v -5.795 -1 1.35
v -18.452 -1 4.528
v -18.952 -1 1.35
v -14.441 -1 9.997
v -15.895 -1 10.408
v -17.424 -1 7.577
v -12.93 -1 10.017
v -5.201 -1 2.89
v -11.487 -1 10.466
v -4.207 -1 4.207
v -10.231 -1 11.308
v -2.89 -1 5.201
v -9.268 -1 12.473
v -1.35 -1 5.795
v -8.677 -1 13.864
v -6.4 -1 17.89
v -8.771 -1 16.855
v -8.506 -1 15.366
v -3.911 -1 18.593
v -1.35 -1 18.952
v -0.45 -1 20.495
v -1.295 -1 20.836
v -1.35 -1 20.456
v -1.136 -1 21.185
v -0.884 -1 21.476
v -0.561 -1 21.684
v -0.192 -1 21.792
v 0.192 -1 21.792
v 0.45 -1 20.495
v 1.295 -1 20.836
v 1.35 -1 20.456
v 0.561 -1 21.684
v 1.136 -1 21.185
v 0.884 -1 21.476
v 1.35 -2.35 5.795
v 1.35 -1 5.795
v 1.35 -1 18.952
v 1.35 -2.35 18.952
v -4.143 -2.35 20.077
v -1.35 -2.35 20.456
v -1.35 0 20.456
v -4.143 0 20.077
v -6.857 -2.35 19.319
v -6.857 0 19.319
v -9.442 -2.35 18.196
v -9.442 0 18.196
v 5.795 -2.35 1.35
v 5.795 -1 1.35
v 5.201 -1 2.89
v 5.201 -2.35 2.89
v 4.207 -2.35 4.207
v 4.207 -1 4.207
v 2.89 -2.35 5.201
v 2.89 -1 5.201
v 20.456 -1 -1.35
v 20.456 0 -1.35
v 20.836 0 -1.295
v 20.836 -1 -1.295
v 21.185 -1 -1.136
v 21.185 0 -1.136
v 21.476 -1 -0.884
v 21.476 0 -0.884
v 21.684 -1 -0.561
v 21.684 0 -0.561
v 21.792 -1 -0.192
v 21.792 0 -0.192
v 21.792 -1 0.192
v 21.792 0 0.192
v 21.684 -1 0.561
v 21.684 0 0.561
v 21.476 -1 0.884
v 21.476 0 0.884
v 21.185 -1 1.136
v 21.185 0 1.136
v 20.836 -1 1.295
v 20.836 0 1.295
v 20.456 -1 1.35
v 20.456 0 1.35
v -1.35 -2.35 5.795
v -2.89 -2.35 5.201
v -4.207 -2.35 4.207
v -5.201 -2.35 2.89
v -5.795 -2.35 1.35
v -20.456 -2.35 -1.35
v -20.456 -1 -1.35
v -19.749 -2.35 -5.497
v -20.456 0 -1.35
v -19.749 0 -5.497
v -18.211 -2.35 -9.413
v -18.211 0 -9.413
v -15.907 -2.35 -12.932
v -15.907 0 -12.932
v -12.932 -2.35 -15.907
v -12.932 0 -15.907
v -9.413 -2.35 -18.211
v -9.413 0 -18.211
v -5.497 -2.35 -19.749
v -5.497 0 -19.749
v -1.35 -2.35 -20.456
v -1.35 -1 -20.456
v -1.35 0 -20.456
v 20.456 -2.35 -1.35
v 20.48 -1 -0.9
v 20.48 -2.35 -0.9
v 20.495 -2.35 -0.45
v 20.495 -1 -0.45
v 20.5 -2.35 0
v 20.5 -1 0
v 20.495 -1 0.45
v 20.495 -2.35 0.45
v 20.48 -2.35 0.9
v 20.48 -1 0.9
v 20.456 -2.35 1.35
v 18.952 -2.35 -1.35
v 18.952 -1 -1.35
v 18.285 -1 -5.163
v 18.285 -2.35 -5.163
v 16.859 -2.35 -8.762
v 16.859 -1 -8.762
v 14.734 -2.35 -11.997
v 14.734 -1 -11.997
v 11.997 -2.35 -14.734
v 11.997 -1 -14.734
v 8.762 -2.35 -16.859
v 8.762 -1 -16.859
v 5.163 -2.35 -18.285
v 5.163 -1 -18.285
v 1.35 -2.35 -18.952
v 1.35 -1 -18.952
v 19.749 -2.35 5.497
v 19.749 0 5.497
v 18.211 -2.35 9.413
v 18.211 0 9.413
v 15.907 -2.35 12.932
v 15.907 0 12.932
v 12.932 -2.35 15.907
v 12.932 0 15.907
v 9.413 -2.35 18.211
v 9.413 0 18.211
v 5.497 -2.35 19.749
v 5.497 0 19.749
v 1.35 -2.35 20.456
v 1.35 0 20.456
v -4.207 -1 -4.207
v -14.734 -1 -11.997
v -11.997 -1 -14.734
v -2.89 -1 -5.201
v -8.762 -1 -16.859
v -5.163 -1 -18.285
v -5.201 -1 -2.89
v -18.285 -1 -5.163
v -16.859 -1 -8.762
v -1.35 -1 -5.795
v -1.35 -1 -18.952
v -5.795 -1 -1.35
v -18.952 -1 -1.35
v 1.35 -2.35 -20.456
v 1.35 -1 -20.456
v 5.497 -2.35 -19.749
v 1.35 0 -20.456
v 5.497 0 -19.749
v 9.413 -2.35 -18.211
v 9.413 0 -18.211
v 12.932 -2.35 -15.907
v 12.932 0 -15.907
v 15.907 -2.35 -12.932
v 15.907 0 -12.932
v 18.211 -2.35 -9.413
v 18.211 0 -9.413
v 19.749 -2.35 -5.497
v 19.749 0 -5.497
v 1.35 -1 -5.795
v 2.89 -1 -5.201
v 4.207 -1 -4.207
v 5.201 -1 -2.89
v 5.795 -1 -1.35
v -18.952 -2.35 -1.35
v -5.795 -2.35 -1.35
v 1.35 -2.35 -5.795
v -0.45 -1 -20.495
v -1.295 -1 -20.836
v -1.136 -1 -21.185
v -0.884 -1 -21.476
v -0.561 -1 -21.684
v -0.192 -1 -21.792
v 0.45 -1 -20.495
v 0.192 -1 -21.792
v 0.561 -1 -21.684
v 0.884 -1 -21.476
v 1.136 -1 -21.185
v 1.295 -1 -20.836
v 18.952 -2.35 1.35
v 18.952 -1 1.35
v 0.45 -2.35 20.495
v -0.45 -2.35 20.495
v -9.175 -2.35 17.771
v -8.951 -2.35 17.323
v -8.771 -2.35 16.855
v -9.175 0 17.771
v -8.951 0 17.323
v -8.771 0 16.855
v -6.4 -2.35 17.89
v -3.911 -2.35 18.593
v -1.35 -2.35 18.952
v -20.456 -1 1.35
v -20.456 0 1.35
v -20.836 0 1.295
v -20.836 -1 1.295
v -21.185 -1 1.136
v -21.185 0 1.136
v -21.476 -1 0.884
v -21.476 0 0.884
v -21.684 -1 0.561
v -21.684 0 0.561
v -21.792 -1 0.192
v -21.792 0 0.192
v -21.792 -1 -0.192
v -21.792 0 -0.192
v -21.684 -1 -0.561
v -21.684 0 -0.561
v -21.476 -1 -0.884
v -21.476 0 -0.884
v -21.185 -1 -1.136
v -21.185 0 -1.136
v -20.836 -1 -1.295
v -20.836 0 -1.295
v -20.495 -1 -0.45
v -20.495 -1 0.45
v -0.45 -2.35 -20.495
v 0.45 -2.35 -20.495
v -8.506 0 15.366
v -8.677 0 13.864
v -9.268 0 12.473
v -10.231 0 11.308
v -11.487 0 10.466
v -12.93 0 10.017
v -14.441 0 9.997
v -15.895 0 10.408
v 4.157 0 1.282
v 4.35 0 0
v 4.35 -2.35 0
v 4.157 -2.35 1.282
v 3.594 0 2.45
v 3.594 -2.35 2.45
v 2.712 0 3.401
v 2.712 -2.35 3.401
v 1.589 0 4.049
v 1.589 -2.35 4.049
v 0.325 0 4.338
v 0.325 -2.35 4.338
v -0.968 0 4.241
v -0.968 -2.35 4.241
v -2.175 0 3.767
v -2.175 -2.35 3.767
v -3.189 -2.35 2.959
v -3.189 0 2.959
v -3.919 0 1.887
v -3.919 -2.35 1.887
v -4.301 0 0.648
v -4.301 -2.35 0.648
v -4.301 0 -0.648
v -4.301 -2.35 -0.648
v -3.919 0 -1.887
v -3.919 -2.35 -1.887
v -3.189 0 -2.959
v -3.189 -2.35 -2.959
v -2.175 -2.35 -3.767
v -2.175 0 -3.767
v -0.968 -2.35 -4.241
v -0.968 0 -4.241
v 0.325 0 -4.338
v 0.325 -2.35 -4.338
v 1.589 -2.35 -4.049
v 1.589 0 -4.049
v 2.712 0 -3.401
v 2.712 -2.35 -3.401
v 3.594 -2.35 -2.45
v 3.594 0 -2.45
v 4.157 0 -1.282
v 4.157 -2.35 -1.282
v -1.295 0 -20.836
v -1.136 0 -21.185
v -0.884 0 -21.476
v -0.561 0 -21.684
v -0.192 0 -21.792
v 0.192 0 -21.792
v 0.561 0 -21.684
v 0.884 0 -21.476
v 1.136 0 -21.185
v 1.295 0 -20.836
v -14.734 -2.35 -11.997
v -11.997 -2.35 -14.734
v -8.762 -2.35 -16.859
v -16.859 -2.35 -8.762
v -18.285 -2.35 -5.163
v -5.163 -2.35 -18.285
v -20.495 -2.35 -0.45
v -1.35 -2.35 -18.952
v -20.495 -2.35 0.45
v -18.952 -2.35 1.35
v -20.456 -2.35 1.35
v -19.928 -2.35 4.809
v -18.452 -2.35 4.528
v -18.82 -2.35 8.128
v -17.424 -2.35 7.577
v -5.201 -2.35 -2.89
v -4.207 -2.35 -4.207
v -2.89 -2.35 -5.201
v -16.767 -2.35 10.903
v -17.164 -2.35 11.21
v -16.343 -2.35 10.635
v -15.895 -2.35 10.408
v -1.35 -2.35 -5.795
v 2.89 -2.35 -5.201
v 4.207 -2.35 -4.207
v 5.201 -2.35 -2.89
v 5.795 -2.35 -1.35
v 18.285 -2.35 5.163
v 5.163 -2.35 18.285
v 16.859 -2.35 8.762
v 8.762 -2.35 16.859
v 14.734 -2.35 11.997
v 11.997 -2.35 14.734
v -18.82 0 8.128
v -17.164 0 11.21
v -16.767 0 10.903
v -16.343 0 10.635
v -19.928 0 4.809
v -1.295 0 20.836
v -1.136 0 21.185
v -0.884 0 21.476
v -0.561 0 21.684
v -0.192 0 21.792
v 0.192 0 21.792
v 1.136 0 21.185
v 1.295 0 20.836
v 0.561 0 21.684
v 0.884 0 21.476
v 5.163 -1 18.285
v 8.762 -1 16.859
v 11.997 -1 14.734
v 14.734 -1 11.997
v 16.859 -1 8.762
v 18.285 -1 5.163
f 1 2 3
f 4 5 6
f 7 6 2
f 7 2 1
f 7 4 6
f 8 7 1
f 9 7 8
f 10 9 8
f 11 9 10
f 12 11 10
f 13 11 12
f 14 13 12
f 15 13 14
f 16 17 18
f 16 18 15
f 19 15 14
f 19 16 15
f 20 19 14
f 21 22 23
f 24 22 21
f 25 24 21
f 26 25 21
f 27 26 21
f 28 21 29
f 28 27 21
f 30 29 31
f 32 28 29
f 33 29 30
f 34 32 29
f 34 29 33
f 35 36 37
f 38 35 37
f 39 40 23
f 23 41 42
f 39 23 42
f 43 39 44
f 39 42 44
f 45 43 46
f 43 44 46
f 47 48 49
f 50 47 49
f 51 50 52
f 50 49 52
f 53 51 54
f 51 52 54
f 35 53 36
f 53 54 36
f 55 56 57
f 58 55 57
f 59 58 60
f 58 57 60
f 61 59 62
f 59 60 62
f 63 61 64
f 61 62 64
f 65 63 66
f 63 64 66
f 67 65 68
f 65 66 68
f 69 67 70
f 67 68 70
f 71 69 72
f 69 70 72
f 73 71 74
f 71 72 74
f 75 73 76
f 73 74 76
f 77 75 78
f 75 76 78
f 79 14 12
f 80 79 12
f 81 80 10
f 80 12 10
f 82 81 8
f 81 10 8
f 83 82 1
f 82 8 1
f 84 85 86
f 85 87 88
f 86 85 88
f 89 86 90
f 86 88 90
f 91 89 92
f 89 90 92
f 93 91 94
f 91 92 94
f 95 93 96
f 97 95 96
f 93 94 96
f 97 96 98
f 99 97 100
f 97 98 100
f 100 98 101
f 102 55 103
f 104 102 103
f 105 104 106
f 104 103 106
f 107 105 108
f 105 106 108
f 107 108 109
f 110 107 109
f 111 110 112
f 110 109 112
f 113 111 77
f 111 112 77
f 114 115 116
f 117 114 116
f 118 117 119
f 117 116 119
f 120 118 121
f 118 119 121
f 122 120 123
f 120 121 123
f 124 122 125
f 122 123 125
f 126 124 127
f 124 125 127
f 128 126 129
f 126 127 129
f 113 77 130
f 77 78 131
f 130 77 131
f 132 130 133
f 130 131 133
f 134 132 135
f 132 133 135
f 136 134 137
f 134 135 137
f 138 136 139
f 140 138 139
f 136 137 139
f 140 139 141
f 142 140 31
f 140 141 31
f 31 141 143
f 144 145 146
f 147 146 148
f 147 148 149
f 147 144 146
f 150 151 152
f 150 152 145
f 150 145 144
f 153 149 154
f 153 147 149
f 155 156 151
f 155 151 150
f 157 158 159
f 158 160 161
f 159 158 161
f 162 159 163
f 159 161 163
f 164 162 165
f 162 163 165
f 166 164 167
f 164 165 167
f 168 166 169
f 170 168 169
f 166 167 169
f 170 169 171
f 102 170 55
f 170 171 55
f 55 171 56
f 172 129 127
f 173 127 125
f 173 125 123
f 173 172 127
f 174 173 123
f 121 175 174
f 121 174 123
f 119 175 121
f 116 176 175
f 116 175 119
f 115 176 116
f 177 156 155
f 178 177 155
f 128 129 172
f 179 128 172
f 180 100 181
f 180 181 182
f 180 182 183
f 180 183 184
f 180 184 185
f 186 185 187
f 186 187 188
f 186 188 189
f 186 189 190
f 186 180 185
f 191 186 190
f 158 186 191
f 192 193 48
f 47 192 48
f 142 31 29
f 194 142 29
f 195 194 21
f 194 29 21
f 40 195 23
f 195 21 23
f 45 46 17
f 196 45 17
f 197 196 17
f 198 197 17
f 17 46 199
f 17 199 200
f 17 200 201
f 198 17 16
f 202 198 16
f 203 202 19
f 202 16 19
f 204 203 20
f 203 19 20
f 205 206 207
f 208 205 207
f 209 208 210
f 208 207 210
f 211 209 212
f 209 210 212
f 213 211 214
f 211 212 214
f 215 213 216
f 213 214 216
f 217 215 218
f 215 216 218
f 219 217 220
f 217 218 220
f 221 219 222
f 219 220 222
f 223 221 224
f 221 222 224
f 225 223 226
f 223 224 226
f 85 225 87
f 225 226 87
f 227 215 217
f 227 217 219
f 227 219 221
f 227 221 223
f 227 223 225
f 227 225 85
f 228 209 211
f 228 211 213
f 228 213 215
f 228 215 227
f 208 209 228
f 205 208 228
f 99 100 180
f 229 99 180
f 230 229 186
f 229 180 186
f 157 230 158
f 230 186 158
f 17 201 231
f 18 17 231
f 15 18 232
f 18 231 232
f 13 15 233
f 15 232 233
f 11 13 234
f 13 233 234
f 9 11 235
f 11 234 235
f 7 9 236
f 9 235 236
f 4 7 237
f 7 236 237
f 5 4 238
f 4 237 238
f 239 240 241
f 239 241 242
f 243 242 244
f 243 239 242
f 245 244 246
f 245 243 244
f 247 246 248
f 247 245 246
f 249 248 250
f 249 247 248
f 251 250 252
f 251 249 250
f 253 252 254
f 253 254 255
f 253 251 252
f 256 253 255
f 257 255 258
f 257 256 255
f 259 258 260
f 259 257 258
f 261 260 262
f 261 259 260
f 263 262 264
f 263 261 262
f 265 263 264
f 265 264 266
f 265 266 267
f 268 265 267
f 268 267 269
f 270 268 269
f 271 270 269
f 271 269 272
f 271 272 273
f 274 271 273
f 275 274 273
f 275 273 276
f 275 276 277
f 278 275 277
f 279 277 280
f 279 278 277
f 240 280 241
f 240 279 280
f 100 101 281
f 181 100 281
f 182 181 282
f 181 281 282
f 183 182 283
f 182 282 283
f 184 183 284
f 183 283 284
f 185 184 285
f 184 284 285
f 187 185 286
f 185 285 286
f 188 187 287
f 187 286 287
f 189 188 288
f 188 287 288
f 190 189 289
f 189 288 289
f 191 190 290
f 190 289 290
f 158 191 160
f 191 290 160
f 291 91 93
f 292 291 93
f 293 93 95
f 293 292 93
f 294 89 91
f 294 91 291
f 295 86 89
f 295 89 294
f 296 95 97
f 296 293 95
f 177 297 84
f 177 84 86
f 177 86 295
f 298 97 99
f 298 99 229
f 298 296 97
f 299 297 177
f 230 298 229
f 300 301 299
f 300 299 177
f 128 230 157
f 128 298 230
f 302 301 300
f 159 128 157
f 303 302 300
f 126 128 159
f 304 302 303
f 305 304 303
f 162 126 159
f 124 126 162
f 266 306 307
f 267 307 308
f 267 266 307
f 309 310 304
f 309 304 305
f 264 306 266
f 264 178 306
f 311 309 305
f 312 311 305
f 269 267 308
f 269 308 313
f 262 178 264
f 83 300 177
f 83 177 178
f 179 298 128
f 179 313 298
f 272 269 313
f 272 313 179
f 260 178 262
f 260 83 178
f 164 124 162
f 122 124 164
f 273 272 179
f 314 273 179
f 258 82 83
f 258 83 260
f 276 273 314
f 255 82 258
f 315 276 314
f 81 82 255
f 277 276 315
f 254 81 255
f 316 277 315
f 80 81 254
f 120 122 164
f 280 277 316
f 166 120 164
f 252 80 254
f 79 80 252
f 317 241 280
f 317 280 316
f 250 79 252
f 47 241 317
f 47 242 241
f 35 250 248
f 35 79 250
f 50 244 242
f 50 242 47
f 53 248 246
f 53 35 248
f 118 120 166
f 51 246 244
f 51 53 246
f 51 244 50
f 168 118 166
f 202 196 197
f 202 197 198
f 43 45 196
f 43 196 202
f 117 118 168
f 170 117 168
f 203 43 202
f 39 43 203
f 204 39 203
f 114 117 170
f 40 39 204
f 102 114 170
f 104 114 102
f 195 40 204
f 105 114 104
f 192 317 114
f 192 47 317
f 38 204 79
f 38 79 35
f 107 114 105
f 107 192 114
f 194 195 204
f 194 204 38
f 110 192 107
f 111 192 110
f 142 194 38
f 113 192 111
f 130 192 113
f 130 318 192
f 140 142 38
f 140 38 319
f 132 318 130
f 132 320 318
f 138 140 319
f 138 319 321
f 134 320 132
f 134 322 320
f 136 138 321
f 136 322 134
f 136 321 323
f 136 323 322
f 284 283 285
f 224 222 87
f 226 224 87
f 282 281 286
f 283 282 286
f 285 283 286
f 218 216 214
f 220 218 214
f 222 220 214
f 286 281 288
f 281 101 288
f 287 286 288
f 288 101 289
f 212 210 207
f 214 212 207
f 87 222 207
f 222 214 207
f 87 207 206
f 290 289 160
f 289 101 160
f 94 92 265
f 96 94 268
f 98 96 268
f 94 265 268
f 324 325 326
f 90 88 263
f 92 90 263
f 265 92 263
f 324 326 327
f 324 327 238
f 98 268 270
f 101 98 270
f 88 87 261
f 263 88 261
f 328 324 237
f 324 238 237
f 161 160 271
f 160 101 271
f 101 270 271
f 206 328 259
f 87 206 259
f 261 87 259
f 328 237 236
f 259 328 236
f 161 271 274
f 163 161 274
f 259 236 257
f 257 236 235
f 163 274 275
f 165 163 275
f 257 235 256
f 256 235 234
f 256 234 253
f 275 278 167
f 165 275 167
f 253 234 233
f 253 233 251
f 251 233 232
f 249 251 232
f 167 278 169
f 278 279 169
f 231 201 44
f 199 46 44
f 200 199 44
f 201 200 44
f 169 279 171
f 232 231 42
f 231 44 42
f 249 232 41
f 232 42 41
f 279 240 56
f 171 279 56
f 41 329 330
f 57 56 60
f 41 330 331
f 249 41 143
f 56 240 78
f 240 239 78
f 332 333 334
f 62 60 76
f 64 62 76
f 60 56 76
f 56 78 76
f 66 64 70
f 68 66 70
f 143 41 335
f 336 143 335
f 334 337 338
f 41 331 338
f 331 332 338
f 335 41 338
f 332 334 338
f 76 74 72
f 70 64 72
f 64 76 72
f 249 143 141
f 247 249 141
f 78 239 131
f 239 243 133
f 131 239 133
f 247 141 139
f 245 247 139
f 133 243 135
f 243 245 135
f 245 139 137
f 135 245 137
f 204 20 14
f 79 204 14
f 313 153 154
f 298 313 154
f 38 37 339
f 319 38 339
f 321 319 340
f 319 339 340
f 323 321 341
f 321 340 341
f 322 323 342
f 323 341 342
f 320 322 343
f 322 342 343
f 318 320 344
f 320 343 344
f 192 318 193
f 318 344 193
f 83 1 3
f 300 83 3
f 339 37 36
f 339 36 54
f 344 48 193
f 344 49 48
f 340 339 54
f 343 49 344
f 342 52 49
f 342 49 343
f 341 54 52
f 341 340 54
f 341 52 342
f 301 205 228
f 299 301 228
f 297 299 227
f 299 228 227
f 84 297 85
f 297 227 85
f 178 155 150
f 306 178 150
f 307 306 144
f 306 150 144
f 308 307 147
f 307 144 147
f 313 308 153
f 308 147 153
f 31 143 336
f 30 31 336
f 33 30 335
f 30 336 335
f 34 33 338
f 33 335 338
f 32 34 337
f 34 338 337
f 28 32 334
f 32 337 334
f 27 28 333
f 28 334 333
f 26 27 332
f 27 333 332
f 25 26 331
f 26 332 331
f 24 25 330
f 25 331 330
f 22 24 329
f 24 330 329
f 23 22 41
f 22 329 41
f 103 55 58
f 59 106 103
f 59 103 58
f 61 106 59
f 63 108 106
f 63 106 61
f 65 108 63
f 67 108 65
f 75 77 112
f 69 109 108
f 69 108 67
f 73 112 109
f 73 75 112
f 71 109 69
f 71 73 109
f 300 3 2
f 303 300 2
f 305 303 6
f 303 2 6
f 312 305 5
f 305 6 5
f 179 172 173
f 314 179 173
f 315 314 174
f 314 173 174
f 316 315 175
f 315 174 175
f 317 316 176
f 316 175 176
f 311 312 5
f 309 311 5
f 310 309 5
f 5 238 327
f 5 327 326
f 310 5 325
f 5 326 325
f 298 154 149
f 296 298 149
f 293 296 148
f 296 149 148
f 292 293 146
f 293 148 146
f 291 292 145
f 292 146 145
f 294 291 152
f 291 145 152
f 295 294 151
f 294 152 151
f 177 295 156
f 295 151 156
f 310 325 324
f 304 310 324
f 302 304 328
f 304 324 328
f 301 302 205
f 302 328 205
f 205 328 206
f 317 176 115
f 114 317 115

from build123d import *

# Parameters (mm, degrees)
F0_R     = 4.35
F1_DEPTH = 2.35
F2_DEPTH = 1


with BuildPart() as f1:
    # F0 (on Front) → F1 (new body)
    with BuildSketch(Plane.XZ):
        with BuildLine():
            ThreePointArc((18.951979, 1.35), (18.987991, 0.675427), (19, 0))
            ThreePointArc((19, 0), (18.987991, -0.675427), (18.951979, -1.35))
            ThreePointArc((18.951979, -1.35), (13.435029, -13.435029), (1.35, -18.951979))
            ThreePointArc((1.35, -18.951979), (0, -19), (-1.35, -18.951979))
            ThreePointArc((-1.35, -18.951979), (-13.435029, -13.435029), (-18.951979, -1.35))
            ThreePointArc((-18.951979, -1.35), (-19, 0), (-18.951979, 1.35))
            ThreePointArc((-18.951979, 1.35), (-18.002767, 6.074569), (-15.895465, 10.408371))
            ThreePointArc((-15.895465, 10.408371), (-16.558319, 10.763563), (-17.163626, 11.209815))
            ThreePointArc((-17.163626, 11.209815), (-19.444888, 6.492022), (-20.4555, 1.35))
            ThreePointArc((-20.4555, 1.35), (-20.5, 0), (-20.4555, -1.35))
            ThreePointArc((-20.4555, -1.35), (-14.495689, -14.495689), (-1.35, -20.4555))
            ThreePointArc((-1.35, -20.4555), (0, -20.5), (1.35, -20.4555))
            ThreePointArc((1.35, -20.4555), (14.495689, -14.495689), (20.4555, -1.35))
            ThreePointArc((20.4555, -1.35), (20.488872, -0.675367), (20.5, 0))
            ThreePointArc((20.5, 0), (20.488872, 0.675367), (20.4555, 1.35))
            ThreePointArc((20.4555, 1.35), (14.495689, 14.495689), (1.35, 20.4555))
            ThreePointArc((1.35, 20.4555), (0, 20.5), (-1.35, 20.4555))
            ThreePointArc((-1.35, 20.4555), (-5.512738, 19.744866), (-9.441543, 18.196353))
            ThreePointArc((-9.441543, 18.196353), (-9.057906, 17.549546), (-8.770617, 16.854563))
            ThreePointArc((-8.770617, 16.854563), (-5.167834, 18.283695), (-1.35, 18.951979))
            ThreePointArc((-1.35, 18.951979), (0, 19), (1.35, 18.951979))
            ThreePointArc((1.35, 18.951979), (13.435029, 13.435029), (18.951979, 1.35))
        make_face()
        with BuildLine():
            ThreePointArc((5.95, 0), (5.911079, 0.679444), (5.794825, 1.35))
            ThreePointArc((5.794825, 1.35), (4.207285, 4.207285), (1.35, 5.794825))
            ThreePointArc((1.35, 5.794825), (0, 5.95), (-1.35, 5.794825))
            ThreePointArc((-1.35, 5.794825), (-4.207285, 4.207285), (-5.794825, 1.35))
            ThreePointArc((-5.794825, 1.35), (-5.95, 0), (-5.794825, -1.35))
            ThreePointArc((-5.794825, -1.35), (-4.207285, -4.207285), (-1.35, -5.794825))
            ThreePointArc((-1.35, -5.794825), (0, -5.95), (1.35, -5.794825))
            ThreePointArc((1.35, -5.794825), (4.207285, -4.207285), (5.794825, -1.35))
            ThreePointArc((5.794825, -1.35), (5.911079, -0.679444), (5.95, 0))
        make_face()
        Circle(F0_R, mode=Mode.SUBTRACT)
        with BuildLine():
            ThreePointArc((-18.951979, 1.35), (-19, 0), (-18.951979, -1.35))
            Line((-18.951979, -1.35), (-5.794825, -1.35))
            ThreePointArc((-5.794825, -1.35), (-5.95, 0), (-5.794825, 1.35))
            Line((-5.794825, 1.35), (-18.951979, 1.35))
        make_face()
        with BuildLine():
            Line((1.35, 5.794825), (1.35, 18.951979))
            ThreePointArc((1.35, 18.951979), (0, 19), (-1.35, 18.951979))
            Line((-1.35, 18.951979), (-1.35, 5.794825))
            ThreePointArc((-1.35, 5.794825), (0, 5.95), (1.35, 5.794825))
        make_face()
        with BuildLine():
            ThreePointArc((18.951979, -1.35), (18.987991, -0.675427), (19, 0))
            ThreePointArc((19, 0), (18.987991, 0.675427), (18.951979, 1.35))
            Line((18.951979, 1.35), (5.794825, 1.35))
            ThreePointArc((5.794825, 1.35), (5.911079, 0.679444), (5.95, 0))
            ThreePointArc((5.95, 0), (5.911079, -0.679444), (5.794825, -1.35))
            Line((5.794825, -1.35), (18.951979, -1.35))
        make_face()
        with BuildLine():
            ThreePointArc((-1.35, -18.951979), (0, -19), (1.35, -18.951979))
            Line((1.35, -18.951979), (1.35, -5.794825))
            ThreePointArc((1.35, -5.794825), (0, -5.95), (-1.35, -5.794825))
            Line((-1.35, -5.794825), (-1.35, -18.951979))
        make_face()
    extrude(amount=F1_DEPTH)

    # F0 (on Front) → F2 (join)
    with BuildSketch(Plane.XZ):
        with BuildLine():
            Line((-1.35, 5.794825), (-1.35, 18.951979))
            ThreePointArc((-1.35, 18.951979), (-5.167834, 18.283695), (-8.770617, 16.854563))
            ThreePointArc((-8.770617, 16.854563), (-10.231341, 11.308499), (-15.895465, 10.408371))
            ThreePointArc((-15.895465, 10.408371), (-18.002767, 6.074569), (-18.951979, 1.35))
            Line((-18.951979, 1.35), (-5.794825, 1.35))
            ThreePointArc((-5.794825, 1.35), (-4.207285, 4.207285), (-1.35, 5.794825))
        make_face()
        with BuildLine():
            Line((5.794825, 1.35), (18.951979, 1.35))
            ThreePointArc((18.951979, 1.35), (13.435029, 13.435029), (1.35, 18.951979))
            Line((1.35, 18.951979), (1.35, 5.794825))
            ThreePointArc((1.35, 5.794825), (4.207285, 4.207285), (5.794825, 1.35))
        make_face()
        with BuildLine():
            ThreePointArc((1.35, -18.951979), (13.435029, -13.435029), (18.951979, -1.35))
            Line((18.951979, -1.35), (5.794825, -1.35))
            ThreePointArc((5.794825, -1.35), (4.207285, -4.207285), (1.35, -5.794825))
            Line((1.35, -5.794825), (1.35, -18.951979))
        make_face()
        with BuildLine():
            ThreePointArc((-18.951979, -1.35), (-13.435029, -13.435029), (-1.35, -18.951979))
            Line((-1.35, -18.951979), (-1.35, -5.794825))
            ThreePointArc((-1.35, -5.794825), (-4.207285, -4.207285), (-5.794825, -1.35))
            Line((-5.794825, -1.35), (-18.951979, -1.35))
        make_face()
        with BuildLine():
            ThreePointArc((-20.4555, -1.35), (-20.5, 0), (-20.4555, 1.35))
            ThreePointArc((-20.4555, 1.35), (-21.8055, 0), (-20.4555, -1.35))
        make_face()
        with BuildLine():
            ThreePointArc((1.35, 20.4555), (0, 21.8055), (-1.35, 20.4555))
            ThreePointArc((-1.35, 20.4555), (0, 20.5), (1.35, 20.4555))
        make_face()
        with BuildLine():
            ThreePointArc((20.4555, -1.35), (21.8055, 0), (20.4555, 1.35))
            ThreePointArc((20.4555, 1.35), (20.488872, 0.675367), (20.5, 0))
            ThreePointArc((20.5, 0), (20.488872, -0.675367), (20.4555, -1.35))
        make_face()
        with BuildLine():
            ThreePointArc((1.35, -20.4555), (0, -20.5), (-1.35, -20.4555))
            ThreePointArc((-1.35, -20.4555), (0, -21.8055), (1.35, -20.4555))
        make_face()
    extrude(amount=F2_DEPTH)


solid = f1.part
